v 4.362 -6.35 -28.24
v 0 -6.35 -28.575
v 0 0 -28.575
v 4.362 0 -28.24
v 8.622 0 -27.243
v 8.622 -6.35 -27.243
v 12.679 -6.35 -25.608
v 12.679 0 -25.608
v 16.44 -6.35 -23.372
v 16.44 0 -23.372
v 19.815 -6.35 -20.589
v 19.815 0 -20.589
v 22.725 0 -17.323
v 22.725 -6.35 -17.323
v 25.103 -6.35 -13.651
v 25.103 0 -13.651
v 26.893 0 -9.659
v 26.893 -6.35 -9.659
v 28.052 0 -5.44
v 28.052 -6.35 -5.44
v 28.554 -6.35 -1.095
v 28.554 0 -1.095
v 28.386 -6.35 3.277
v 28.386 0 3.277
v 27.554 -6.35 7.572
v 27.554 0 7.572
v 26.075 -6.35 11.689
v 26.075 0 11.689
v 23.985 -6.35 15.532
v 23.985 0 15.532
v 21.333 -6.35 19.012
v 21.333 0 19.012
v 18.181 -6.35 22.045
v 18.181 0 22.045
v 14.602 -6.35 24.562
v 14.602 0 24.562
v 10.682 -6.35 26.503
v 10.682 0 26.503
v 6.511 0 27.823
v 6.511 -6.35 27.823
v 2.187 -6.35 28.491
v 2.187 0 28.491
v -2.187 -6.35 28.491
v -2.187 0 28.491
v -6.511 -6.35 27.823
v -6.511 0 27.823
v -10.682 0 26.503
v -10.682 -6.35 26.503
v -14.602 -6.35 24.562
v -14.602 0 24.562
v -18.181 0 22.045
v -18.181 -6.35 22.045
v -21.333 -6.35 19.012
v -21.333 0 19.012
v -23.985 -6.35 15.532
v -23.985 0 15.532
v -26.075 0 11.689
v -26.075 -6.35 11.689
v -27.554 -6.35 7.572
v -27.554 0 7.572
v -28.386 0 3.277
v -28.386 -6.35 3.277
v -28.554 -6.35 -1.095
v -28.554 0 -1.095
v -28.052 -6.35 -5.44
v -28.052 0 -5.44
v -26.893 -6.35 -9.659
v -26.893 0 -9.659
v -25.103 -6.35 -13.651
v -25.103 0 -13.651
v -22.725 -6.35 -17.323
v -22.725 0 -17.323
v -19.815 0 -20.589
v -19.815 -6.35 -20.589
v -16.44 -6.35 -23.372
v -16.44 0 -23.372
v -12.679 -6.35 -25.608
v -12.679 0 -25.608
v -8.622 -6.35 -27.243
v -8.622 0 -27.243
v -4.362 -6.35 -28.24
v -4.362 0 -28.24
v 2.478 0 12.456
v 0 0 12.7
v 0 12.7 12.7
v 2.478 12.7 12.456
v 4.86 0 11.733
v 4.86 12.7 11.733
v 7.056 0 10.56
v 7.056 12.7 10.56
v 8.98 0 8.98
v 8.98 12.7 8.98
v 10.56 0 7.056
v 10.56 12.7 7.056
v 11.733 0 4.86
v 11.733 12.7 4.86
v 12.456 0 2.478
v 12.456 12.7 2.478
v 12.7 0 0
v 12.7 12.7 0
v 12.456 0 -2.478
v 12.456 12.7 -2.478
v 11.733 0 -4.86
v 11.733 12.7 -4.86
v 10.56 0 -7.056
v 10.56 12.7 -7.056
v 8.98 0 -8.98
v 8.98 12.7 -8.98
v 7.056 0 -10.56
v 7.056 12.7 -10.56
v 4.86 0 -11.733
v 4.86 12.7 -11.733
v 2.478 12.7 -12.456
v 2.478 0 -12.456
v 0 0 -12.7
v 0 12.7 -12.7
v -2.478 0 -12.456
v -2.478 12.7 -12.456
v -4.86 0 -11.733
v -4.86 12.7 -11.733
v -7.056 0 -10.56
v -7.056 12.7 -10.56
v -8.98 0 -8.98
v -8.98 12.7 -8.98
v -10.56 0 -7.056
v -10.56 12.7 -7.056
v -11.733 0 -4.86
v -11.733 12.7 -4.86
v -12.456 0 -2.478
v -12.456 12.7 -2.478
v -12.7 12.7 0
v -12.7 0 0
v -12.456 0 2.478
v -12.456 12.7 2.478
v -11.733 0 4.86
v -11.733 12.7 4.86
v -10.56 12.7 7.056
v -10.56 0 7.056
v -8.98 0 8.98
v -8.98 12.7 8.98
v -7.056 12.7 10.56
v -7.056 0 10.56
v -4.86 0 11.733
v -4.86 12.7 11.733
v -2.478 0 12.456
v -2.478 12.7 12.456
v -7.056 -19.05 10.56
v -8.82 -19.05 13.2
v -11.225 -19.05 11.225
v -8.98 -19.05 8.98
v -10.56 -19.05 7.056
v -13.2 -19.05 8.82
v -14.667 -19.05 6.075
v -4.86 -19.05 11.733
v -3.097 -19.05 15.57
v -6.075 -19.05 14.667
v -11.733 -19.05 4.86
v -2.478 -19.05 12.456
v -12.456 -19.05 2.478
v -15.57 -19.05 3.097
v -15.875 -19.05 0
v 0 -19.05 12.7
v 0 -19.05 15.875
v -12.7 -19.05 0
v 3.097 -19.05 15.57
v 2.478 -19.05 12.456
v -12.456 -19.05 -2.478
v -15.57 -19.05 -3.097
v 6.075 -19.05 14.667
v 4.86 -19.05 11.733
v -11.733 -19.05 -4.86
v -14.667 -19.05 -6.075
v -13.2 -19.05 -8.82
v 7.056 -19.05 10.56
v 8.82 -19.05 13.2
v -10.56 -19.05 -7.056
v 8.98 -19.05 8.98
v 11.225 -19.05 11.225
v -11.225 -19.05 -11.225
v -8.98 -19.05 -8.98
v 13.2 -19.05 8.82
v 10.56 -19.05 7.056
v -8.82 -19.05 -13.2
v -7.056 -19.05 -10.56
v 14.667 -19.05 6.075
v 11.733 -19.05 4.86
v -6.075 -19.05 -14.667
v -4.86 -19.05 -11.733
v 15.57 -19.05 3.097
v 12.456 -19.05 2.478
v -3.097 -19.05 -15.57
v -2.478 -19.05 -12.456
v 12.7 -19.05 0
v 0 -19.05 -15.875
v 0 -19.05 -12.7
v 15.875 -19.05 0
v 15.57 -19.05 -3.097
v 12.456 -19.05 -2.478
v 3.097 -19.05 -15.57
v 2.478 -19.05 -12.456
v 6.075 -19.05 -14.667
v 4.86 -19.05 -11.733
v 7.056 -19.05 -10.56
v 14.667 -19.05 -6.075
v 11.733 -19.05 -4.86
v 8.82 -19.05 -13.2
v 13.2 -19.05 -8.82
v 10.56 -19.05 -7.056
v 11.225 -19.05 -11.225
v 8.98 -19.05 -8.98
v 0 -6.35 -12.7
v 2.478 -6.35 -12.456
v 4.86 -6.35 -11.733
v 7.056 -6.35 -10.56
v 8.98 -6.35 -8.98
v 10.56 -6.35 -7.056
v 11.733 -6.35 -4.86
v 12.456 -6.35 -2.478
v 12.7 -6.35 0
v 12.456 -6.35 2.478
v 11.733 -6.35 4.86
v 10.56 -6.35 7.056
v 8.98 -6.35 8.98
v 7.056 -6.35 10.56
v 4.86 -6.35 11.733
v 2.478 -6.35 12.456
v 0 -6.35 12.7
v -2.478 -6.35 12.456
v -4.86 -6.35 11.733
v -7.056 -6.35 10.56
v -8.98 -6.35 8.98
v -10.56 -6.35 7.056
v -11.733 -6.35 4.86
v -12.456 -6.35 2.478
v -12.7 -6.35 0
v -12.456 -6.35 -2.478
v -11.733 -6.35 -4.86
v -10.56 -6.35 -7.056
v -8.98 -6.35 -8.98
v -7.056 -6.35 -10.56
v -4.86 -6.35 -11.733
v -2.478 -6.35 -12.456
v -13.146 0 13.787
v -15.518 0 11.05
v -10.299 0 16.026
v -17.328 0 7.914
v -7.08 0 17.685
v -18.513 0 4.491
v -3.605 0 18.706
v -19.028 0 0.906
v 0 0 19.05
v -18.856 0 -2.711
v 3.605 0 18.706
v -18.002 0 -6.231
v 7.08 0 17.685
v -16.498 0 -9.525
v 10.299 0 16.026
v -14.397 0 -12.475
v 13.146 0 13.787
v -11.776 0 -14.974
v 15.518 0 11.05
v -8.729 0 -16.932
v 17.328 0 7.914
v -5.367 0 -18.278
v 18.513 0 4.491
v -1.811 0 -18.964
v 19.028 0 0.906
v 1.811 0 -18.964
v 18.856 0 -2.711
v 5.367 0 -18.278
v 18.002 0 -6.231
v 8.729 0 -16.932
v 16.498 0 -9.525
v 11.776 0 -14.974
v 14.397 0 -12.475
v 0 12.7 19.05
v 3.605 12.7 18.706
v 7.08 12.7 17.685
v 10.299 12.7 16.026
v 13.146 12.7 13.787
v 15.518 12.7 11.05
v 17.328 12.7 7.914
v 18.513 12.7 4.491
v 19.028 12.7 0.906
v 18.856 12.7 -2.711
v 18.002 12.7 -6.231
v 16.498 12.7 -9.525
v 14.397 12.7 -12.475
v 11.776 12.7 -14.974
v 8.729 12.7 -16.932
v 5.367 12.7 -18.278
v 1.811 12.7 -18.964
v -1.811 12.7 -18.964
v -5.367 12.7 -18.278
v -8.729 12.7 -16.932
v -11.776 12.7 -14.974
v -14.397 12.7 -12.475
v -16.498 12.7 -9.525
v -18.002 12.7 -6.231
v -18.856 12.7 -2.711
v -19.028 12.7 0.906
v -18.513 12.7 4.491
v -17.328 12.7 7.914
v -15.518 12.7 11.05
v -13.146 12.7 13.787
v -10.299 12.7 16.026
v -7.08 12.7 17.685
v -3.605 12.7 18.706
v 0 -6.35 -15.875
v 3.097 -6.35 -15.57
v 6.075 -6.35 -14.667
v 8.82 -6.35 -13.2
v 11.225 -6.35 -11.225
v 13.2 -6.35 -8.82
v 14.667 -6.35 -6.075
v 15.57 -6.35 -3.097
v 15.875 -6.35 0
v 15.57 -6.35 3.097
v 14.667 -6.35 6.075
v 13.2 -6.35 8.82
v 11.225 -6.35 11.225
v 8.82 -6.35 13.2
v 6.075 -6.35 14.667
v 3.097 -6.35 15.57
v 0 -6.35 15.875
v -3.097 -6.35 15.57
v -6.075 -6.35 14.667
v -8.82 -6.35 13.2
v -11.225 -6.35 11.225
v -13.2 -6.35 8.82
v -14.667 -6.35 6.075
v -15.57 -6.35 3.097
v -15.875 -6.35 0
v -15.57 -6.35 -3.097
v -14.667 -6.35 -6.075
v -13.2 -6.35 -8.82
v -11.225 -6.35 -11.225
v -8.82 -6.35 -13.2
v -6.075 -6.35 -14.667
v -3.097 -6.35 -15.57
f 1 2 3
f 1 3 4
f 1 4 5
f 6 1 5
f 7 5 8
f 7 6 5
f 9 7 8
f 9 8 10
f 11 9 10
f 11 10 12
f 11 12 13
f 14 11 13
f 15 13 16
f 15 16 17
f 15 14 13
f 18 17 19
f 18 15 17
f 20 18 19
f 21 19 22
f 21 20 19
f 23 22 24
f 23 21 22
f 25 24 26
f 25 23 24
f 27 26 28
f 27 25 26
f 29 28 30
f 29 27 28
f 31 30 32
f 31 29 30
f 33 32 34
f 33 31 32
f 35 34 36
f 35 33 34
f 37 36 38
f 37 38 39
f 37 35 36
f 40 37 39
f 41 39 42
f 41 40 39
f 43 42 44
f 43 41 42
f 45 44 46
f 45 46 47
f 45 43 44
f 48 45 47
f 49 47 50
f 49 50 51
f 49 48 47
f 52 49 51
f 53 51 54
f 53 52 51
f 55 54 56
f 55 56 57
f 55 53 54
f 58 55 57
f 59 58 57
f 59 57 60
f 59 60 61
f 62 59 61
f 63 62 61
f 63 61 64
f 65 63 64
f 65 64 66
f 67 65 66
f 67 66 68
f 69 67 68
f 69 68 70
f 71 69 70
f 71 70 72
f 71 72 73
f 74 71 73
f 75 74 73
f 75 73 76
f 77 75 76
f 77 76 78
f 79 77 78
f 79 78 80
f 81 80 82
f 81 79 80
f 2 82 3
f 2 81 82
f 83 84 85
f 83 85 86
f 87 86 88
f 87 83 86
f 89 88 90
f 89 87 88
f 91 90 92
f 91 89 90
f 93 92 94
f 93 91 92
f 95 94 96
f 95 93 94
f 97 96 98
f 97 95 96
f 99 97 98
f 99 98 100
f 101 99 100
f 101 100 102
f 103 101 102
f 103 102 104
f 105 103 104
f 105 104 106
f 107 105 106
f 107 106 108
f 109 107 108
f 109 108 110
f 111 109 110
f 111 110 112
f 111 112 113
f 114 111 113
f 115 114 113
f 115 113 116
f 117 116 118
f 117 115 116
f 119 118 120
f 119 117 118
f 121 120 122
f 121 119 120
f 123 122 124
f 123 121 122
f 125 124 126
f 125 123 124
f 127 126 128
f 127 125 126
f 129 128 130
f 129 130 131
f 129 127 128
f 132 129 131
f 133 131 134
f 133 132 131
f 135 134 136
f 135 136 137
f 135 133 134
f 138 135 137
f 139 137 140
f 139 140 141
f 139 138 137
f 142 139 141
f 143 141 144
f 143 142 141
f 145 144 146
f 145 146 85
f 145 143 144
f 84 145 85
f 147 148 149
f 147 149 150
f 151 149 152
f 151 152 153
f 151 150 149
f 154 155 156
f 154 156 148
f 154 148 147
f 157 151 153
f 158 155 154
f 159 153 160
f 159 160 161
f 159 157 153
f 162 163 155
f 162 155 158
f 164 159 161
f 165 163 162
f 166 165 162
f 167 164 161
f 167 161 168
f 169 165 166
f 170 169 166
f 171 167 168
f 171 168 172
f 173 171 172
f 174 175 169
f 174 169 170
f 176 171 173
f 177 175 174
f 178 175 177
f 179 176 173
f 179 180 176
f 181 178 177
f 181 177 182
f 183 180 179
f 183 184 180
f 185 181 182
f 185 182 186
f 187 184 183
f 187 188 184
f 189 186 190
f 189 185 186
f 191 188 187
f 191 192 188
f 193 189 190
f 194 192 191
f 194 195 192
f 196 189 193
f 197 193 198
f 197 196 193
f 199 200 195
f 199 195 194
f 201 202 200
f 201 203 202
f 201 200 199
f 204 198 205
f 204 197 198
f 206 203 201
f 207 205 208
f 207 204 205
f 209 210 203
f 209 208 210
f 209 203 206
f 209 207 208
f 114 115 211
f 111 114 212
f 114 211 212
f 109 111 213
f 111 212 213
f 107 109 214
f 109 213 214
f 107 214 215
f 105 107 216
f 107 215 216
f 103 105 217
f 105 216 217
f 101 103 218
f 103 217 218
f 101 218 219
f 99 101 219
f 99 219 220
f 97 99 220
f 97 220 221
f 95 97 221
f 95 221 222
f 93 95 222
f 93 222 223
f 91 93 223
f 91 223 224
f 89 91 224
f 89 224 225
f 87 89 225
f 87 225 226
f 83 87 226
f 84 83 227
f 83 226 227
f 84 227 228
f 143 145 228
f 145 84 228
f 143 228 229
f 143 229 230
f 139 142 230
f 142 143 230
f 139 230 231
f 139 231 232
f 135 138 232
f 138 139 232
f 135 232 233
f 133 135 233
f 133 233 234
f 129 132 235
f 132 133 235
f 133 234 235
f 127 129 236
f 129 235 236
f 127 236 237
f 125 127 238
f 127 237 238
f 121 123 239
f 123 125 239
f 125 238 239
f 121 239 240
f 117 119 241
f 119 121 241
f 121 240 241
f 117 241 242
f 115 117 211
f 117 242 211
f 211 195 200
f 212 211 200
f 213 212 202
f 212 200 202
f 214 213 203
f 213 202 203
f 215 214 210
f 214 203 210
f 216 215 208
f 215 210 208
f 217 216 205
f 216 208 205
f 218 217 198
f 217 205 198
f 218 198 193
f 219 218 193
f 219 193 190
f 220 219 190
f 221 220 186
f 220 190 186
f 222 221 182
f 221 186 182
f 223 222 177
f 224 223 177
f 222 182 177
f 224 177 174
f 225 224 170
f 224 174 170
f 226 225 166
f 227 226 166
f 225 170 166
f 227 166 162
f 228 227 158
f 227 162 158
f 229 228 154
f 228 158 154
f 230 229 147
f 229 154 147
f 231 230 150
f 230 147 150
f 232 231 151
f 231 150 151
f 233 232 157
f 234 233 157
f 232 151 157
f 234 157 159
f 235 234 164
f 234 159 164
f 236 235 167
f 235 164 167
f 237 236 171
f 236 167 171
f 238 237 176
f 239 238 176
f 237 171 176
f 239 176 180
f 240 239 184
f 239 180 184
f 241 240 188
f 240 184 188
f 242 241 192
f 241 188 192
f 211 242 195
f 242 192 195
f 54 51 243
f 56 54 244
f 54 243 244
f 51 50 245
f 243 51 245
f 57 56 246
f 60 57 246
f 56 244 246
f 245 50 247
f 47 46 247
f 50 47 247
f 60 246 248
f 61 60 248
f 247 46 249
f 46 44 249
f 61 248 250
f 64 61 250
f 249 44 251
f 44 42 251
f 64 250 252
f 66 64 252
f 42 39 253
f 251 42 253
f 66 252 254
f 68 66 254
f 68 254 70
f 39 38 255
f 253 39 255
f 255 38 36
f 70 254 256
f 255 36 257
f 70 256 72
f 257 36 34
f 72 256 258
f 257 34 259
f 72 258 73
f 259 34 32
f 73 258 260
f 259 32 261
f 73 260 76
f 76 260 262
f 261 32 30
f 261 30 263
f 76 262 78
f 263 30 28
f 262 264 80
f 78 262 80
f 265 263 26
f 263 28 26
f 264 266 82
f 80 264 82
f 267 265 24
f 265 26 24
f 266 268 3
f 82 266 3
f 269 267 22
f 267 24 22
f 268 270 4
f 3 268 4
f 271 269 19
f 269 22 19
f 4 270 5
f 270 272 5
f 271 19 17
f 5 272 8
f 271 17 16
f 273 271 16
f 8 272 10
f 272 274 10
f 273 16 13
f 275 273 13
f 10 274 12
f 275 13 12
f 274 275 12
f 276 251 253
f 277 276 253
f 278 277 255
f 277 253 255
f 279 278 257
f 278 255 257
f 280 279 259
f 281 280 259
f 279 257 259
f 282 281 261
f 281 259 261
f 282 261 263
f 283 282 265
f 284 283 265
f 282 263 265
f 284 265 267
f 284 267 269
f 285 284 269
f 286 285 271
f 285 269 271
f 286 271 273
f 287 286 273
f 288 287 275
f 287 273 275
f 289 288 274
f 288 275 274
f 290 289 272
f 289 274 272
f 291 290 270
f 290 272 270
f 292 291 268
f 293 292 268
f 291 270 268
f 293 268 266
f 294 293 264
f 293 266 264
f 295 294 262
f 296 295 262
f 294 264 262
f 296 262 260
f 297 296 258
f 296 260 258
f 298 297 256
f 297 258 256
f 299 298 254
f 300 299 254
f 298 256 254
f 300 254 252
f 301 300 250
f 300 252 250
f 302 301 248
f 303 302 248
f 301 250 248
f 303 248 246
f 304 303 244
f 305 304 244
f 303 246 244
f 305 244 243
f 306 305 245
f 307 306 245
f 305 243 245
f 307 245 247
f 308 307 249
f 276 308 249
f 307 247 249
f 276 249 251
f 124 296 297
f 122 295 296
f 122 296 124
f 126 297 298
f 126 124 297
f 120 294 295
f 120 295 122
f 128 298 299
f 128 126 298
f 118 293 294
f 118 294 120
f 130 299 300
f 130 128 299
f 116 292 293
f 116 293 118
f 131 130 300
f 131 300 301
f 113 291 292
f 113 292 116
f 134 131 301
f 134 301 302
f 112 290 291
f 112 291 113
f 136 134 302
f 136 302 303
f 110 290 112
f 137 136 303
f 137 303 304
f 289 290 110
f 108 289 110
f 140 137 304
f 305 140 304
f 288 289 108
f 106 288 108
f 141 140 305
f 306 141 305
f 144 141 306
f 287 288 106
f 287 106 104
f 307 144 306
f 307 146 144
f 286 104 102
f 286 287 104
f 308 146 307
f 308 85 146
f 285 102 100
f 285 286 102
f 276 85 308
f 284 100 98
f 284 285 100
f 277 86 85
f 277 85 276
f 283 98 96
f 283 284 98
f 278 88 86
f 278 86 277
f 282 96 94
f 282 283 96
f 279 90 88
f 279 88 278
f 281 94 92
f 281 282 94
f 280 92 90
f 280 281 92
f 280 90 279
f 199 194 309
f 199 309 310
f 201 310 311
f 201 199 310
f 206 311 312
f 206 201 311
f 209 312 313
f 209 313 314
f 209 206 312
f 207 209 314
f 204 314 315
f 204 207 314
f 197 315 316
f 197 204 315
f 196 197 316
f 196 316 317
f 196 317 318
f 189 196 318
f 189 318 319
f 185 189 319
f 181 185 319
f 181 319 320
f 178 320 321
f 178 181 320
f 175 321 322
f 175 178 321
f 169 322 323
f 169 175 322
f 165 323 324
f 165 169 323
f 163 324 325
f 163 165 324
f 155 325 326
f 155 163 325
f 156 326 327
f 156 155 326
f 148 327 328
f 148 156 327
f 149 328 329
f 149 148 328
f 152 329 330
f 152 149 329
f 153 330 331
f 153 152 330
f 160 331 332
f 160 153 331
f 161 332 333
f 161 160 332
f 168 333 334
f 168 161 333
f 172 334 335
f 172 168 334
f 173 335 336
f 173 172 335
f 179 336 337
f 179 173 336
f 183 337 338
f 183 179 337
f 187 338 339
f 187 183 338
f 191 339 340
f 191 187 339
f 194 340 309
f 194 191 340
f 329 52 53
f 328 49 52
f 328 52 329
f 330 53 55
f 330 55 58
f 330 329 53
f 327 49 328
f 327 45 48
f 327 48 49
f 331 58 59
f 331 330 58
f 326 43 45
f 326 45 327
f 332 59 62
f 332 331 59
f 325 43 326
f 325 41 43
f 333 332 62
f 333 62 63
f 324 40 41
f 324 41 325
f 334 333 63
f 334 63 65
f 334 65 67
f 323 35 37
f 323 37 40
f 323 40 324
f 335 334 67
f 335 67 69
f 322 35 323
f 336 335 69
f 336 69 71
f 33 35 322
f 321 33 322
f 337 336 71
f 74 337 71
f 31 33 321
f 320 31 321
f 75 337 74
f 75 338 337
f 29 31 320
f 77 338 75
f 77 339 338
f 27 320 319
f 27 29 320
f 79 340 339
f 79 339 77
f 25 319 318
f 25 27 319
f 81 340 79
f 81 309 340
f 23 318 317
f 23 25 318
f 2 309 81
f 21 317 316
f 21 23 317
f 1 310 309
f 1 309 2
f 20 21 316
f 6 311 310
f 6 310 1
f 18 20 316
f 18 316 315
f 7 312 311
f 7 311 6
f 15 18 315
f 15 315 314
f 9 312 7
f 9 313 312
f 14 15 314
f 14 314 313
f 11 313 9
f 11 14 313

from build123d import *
from build123d.topology import SkipClean

# Parameters (mm, degrees)
SKETCH1_R    = 19.05
SKETCH1_R_2  = 12.7
TOP_DEPTH    = 12.7
MIDDLE_START = 6.35
SKETCH4_R    = 28.575
SKETCH4_R_2  = 12.7
MIDDLE_DEPTH = 6.35
BOTTOM_START = 12.7
SKETCH5_R    = 15.875
SKETCH5_R_2  = 12.7
BOTTOM_DEPTH = 12.7


with BuildPart() as part:
    # Sketch1 → Top (new body)
    with BuildSketch(Plane(origin=(0, 0, 0), x_dir=(1, 0, 0), z_dir=(0, 1, 0))):
        with Locations(Location((0, 0, 0), (0, 0, 270))):
            Circle(SKETCH1_R)
        with Locations(Location((0, 0, 0), (0, 0, 270))):
            Circle(SKETCH1_R_2, mode=Mode.SUBTRACT)
    extrude(amount=TOP_DEPTH)

    # Sketch4 → Middle (add)
    with SkipClean():  # the faces are left unmerged after this step: merging them gives an invalid solid
        with BuildSketch(Plane.XZ.offset(MIDDLE_START)):
            with Locations(Location((0, 0, 0), (0, 0, 270))):
                Circle(SKETCH4_R)
            with Locations(Location((0, 0, 0), (0, 0, 270))):
                Circle(SKETCH4_R_2, mode=Mode.SUBTRACT)
        extrude(amount=-MIDDLE_DEPTH)

    # Sketch5 → Bottom (add)
    with SkipClean():  # the faces are left unmerged after this step: merging them gives an invalid solid
        with BuildSketch(Plane.XZ.offset(6.35).offset(BOTTOM_START)):
            with Locations(Location((0, 0, 0), (0, 0, 270))):
                Circle(SKETCH5_R)
            with Locations(Location((0, 0, 0), (0, 0, 270))):
                Circle(SKETCH5_R_2, mode=Mode.SUBTRACT)
        extrude(amount=-BOTTOM_DEPTH)


solid = part.part
